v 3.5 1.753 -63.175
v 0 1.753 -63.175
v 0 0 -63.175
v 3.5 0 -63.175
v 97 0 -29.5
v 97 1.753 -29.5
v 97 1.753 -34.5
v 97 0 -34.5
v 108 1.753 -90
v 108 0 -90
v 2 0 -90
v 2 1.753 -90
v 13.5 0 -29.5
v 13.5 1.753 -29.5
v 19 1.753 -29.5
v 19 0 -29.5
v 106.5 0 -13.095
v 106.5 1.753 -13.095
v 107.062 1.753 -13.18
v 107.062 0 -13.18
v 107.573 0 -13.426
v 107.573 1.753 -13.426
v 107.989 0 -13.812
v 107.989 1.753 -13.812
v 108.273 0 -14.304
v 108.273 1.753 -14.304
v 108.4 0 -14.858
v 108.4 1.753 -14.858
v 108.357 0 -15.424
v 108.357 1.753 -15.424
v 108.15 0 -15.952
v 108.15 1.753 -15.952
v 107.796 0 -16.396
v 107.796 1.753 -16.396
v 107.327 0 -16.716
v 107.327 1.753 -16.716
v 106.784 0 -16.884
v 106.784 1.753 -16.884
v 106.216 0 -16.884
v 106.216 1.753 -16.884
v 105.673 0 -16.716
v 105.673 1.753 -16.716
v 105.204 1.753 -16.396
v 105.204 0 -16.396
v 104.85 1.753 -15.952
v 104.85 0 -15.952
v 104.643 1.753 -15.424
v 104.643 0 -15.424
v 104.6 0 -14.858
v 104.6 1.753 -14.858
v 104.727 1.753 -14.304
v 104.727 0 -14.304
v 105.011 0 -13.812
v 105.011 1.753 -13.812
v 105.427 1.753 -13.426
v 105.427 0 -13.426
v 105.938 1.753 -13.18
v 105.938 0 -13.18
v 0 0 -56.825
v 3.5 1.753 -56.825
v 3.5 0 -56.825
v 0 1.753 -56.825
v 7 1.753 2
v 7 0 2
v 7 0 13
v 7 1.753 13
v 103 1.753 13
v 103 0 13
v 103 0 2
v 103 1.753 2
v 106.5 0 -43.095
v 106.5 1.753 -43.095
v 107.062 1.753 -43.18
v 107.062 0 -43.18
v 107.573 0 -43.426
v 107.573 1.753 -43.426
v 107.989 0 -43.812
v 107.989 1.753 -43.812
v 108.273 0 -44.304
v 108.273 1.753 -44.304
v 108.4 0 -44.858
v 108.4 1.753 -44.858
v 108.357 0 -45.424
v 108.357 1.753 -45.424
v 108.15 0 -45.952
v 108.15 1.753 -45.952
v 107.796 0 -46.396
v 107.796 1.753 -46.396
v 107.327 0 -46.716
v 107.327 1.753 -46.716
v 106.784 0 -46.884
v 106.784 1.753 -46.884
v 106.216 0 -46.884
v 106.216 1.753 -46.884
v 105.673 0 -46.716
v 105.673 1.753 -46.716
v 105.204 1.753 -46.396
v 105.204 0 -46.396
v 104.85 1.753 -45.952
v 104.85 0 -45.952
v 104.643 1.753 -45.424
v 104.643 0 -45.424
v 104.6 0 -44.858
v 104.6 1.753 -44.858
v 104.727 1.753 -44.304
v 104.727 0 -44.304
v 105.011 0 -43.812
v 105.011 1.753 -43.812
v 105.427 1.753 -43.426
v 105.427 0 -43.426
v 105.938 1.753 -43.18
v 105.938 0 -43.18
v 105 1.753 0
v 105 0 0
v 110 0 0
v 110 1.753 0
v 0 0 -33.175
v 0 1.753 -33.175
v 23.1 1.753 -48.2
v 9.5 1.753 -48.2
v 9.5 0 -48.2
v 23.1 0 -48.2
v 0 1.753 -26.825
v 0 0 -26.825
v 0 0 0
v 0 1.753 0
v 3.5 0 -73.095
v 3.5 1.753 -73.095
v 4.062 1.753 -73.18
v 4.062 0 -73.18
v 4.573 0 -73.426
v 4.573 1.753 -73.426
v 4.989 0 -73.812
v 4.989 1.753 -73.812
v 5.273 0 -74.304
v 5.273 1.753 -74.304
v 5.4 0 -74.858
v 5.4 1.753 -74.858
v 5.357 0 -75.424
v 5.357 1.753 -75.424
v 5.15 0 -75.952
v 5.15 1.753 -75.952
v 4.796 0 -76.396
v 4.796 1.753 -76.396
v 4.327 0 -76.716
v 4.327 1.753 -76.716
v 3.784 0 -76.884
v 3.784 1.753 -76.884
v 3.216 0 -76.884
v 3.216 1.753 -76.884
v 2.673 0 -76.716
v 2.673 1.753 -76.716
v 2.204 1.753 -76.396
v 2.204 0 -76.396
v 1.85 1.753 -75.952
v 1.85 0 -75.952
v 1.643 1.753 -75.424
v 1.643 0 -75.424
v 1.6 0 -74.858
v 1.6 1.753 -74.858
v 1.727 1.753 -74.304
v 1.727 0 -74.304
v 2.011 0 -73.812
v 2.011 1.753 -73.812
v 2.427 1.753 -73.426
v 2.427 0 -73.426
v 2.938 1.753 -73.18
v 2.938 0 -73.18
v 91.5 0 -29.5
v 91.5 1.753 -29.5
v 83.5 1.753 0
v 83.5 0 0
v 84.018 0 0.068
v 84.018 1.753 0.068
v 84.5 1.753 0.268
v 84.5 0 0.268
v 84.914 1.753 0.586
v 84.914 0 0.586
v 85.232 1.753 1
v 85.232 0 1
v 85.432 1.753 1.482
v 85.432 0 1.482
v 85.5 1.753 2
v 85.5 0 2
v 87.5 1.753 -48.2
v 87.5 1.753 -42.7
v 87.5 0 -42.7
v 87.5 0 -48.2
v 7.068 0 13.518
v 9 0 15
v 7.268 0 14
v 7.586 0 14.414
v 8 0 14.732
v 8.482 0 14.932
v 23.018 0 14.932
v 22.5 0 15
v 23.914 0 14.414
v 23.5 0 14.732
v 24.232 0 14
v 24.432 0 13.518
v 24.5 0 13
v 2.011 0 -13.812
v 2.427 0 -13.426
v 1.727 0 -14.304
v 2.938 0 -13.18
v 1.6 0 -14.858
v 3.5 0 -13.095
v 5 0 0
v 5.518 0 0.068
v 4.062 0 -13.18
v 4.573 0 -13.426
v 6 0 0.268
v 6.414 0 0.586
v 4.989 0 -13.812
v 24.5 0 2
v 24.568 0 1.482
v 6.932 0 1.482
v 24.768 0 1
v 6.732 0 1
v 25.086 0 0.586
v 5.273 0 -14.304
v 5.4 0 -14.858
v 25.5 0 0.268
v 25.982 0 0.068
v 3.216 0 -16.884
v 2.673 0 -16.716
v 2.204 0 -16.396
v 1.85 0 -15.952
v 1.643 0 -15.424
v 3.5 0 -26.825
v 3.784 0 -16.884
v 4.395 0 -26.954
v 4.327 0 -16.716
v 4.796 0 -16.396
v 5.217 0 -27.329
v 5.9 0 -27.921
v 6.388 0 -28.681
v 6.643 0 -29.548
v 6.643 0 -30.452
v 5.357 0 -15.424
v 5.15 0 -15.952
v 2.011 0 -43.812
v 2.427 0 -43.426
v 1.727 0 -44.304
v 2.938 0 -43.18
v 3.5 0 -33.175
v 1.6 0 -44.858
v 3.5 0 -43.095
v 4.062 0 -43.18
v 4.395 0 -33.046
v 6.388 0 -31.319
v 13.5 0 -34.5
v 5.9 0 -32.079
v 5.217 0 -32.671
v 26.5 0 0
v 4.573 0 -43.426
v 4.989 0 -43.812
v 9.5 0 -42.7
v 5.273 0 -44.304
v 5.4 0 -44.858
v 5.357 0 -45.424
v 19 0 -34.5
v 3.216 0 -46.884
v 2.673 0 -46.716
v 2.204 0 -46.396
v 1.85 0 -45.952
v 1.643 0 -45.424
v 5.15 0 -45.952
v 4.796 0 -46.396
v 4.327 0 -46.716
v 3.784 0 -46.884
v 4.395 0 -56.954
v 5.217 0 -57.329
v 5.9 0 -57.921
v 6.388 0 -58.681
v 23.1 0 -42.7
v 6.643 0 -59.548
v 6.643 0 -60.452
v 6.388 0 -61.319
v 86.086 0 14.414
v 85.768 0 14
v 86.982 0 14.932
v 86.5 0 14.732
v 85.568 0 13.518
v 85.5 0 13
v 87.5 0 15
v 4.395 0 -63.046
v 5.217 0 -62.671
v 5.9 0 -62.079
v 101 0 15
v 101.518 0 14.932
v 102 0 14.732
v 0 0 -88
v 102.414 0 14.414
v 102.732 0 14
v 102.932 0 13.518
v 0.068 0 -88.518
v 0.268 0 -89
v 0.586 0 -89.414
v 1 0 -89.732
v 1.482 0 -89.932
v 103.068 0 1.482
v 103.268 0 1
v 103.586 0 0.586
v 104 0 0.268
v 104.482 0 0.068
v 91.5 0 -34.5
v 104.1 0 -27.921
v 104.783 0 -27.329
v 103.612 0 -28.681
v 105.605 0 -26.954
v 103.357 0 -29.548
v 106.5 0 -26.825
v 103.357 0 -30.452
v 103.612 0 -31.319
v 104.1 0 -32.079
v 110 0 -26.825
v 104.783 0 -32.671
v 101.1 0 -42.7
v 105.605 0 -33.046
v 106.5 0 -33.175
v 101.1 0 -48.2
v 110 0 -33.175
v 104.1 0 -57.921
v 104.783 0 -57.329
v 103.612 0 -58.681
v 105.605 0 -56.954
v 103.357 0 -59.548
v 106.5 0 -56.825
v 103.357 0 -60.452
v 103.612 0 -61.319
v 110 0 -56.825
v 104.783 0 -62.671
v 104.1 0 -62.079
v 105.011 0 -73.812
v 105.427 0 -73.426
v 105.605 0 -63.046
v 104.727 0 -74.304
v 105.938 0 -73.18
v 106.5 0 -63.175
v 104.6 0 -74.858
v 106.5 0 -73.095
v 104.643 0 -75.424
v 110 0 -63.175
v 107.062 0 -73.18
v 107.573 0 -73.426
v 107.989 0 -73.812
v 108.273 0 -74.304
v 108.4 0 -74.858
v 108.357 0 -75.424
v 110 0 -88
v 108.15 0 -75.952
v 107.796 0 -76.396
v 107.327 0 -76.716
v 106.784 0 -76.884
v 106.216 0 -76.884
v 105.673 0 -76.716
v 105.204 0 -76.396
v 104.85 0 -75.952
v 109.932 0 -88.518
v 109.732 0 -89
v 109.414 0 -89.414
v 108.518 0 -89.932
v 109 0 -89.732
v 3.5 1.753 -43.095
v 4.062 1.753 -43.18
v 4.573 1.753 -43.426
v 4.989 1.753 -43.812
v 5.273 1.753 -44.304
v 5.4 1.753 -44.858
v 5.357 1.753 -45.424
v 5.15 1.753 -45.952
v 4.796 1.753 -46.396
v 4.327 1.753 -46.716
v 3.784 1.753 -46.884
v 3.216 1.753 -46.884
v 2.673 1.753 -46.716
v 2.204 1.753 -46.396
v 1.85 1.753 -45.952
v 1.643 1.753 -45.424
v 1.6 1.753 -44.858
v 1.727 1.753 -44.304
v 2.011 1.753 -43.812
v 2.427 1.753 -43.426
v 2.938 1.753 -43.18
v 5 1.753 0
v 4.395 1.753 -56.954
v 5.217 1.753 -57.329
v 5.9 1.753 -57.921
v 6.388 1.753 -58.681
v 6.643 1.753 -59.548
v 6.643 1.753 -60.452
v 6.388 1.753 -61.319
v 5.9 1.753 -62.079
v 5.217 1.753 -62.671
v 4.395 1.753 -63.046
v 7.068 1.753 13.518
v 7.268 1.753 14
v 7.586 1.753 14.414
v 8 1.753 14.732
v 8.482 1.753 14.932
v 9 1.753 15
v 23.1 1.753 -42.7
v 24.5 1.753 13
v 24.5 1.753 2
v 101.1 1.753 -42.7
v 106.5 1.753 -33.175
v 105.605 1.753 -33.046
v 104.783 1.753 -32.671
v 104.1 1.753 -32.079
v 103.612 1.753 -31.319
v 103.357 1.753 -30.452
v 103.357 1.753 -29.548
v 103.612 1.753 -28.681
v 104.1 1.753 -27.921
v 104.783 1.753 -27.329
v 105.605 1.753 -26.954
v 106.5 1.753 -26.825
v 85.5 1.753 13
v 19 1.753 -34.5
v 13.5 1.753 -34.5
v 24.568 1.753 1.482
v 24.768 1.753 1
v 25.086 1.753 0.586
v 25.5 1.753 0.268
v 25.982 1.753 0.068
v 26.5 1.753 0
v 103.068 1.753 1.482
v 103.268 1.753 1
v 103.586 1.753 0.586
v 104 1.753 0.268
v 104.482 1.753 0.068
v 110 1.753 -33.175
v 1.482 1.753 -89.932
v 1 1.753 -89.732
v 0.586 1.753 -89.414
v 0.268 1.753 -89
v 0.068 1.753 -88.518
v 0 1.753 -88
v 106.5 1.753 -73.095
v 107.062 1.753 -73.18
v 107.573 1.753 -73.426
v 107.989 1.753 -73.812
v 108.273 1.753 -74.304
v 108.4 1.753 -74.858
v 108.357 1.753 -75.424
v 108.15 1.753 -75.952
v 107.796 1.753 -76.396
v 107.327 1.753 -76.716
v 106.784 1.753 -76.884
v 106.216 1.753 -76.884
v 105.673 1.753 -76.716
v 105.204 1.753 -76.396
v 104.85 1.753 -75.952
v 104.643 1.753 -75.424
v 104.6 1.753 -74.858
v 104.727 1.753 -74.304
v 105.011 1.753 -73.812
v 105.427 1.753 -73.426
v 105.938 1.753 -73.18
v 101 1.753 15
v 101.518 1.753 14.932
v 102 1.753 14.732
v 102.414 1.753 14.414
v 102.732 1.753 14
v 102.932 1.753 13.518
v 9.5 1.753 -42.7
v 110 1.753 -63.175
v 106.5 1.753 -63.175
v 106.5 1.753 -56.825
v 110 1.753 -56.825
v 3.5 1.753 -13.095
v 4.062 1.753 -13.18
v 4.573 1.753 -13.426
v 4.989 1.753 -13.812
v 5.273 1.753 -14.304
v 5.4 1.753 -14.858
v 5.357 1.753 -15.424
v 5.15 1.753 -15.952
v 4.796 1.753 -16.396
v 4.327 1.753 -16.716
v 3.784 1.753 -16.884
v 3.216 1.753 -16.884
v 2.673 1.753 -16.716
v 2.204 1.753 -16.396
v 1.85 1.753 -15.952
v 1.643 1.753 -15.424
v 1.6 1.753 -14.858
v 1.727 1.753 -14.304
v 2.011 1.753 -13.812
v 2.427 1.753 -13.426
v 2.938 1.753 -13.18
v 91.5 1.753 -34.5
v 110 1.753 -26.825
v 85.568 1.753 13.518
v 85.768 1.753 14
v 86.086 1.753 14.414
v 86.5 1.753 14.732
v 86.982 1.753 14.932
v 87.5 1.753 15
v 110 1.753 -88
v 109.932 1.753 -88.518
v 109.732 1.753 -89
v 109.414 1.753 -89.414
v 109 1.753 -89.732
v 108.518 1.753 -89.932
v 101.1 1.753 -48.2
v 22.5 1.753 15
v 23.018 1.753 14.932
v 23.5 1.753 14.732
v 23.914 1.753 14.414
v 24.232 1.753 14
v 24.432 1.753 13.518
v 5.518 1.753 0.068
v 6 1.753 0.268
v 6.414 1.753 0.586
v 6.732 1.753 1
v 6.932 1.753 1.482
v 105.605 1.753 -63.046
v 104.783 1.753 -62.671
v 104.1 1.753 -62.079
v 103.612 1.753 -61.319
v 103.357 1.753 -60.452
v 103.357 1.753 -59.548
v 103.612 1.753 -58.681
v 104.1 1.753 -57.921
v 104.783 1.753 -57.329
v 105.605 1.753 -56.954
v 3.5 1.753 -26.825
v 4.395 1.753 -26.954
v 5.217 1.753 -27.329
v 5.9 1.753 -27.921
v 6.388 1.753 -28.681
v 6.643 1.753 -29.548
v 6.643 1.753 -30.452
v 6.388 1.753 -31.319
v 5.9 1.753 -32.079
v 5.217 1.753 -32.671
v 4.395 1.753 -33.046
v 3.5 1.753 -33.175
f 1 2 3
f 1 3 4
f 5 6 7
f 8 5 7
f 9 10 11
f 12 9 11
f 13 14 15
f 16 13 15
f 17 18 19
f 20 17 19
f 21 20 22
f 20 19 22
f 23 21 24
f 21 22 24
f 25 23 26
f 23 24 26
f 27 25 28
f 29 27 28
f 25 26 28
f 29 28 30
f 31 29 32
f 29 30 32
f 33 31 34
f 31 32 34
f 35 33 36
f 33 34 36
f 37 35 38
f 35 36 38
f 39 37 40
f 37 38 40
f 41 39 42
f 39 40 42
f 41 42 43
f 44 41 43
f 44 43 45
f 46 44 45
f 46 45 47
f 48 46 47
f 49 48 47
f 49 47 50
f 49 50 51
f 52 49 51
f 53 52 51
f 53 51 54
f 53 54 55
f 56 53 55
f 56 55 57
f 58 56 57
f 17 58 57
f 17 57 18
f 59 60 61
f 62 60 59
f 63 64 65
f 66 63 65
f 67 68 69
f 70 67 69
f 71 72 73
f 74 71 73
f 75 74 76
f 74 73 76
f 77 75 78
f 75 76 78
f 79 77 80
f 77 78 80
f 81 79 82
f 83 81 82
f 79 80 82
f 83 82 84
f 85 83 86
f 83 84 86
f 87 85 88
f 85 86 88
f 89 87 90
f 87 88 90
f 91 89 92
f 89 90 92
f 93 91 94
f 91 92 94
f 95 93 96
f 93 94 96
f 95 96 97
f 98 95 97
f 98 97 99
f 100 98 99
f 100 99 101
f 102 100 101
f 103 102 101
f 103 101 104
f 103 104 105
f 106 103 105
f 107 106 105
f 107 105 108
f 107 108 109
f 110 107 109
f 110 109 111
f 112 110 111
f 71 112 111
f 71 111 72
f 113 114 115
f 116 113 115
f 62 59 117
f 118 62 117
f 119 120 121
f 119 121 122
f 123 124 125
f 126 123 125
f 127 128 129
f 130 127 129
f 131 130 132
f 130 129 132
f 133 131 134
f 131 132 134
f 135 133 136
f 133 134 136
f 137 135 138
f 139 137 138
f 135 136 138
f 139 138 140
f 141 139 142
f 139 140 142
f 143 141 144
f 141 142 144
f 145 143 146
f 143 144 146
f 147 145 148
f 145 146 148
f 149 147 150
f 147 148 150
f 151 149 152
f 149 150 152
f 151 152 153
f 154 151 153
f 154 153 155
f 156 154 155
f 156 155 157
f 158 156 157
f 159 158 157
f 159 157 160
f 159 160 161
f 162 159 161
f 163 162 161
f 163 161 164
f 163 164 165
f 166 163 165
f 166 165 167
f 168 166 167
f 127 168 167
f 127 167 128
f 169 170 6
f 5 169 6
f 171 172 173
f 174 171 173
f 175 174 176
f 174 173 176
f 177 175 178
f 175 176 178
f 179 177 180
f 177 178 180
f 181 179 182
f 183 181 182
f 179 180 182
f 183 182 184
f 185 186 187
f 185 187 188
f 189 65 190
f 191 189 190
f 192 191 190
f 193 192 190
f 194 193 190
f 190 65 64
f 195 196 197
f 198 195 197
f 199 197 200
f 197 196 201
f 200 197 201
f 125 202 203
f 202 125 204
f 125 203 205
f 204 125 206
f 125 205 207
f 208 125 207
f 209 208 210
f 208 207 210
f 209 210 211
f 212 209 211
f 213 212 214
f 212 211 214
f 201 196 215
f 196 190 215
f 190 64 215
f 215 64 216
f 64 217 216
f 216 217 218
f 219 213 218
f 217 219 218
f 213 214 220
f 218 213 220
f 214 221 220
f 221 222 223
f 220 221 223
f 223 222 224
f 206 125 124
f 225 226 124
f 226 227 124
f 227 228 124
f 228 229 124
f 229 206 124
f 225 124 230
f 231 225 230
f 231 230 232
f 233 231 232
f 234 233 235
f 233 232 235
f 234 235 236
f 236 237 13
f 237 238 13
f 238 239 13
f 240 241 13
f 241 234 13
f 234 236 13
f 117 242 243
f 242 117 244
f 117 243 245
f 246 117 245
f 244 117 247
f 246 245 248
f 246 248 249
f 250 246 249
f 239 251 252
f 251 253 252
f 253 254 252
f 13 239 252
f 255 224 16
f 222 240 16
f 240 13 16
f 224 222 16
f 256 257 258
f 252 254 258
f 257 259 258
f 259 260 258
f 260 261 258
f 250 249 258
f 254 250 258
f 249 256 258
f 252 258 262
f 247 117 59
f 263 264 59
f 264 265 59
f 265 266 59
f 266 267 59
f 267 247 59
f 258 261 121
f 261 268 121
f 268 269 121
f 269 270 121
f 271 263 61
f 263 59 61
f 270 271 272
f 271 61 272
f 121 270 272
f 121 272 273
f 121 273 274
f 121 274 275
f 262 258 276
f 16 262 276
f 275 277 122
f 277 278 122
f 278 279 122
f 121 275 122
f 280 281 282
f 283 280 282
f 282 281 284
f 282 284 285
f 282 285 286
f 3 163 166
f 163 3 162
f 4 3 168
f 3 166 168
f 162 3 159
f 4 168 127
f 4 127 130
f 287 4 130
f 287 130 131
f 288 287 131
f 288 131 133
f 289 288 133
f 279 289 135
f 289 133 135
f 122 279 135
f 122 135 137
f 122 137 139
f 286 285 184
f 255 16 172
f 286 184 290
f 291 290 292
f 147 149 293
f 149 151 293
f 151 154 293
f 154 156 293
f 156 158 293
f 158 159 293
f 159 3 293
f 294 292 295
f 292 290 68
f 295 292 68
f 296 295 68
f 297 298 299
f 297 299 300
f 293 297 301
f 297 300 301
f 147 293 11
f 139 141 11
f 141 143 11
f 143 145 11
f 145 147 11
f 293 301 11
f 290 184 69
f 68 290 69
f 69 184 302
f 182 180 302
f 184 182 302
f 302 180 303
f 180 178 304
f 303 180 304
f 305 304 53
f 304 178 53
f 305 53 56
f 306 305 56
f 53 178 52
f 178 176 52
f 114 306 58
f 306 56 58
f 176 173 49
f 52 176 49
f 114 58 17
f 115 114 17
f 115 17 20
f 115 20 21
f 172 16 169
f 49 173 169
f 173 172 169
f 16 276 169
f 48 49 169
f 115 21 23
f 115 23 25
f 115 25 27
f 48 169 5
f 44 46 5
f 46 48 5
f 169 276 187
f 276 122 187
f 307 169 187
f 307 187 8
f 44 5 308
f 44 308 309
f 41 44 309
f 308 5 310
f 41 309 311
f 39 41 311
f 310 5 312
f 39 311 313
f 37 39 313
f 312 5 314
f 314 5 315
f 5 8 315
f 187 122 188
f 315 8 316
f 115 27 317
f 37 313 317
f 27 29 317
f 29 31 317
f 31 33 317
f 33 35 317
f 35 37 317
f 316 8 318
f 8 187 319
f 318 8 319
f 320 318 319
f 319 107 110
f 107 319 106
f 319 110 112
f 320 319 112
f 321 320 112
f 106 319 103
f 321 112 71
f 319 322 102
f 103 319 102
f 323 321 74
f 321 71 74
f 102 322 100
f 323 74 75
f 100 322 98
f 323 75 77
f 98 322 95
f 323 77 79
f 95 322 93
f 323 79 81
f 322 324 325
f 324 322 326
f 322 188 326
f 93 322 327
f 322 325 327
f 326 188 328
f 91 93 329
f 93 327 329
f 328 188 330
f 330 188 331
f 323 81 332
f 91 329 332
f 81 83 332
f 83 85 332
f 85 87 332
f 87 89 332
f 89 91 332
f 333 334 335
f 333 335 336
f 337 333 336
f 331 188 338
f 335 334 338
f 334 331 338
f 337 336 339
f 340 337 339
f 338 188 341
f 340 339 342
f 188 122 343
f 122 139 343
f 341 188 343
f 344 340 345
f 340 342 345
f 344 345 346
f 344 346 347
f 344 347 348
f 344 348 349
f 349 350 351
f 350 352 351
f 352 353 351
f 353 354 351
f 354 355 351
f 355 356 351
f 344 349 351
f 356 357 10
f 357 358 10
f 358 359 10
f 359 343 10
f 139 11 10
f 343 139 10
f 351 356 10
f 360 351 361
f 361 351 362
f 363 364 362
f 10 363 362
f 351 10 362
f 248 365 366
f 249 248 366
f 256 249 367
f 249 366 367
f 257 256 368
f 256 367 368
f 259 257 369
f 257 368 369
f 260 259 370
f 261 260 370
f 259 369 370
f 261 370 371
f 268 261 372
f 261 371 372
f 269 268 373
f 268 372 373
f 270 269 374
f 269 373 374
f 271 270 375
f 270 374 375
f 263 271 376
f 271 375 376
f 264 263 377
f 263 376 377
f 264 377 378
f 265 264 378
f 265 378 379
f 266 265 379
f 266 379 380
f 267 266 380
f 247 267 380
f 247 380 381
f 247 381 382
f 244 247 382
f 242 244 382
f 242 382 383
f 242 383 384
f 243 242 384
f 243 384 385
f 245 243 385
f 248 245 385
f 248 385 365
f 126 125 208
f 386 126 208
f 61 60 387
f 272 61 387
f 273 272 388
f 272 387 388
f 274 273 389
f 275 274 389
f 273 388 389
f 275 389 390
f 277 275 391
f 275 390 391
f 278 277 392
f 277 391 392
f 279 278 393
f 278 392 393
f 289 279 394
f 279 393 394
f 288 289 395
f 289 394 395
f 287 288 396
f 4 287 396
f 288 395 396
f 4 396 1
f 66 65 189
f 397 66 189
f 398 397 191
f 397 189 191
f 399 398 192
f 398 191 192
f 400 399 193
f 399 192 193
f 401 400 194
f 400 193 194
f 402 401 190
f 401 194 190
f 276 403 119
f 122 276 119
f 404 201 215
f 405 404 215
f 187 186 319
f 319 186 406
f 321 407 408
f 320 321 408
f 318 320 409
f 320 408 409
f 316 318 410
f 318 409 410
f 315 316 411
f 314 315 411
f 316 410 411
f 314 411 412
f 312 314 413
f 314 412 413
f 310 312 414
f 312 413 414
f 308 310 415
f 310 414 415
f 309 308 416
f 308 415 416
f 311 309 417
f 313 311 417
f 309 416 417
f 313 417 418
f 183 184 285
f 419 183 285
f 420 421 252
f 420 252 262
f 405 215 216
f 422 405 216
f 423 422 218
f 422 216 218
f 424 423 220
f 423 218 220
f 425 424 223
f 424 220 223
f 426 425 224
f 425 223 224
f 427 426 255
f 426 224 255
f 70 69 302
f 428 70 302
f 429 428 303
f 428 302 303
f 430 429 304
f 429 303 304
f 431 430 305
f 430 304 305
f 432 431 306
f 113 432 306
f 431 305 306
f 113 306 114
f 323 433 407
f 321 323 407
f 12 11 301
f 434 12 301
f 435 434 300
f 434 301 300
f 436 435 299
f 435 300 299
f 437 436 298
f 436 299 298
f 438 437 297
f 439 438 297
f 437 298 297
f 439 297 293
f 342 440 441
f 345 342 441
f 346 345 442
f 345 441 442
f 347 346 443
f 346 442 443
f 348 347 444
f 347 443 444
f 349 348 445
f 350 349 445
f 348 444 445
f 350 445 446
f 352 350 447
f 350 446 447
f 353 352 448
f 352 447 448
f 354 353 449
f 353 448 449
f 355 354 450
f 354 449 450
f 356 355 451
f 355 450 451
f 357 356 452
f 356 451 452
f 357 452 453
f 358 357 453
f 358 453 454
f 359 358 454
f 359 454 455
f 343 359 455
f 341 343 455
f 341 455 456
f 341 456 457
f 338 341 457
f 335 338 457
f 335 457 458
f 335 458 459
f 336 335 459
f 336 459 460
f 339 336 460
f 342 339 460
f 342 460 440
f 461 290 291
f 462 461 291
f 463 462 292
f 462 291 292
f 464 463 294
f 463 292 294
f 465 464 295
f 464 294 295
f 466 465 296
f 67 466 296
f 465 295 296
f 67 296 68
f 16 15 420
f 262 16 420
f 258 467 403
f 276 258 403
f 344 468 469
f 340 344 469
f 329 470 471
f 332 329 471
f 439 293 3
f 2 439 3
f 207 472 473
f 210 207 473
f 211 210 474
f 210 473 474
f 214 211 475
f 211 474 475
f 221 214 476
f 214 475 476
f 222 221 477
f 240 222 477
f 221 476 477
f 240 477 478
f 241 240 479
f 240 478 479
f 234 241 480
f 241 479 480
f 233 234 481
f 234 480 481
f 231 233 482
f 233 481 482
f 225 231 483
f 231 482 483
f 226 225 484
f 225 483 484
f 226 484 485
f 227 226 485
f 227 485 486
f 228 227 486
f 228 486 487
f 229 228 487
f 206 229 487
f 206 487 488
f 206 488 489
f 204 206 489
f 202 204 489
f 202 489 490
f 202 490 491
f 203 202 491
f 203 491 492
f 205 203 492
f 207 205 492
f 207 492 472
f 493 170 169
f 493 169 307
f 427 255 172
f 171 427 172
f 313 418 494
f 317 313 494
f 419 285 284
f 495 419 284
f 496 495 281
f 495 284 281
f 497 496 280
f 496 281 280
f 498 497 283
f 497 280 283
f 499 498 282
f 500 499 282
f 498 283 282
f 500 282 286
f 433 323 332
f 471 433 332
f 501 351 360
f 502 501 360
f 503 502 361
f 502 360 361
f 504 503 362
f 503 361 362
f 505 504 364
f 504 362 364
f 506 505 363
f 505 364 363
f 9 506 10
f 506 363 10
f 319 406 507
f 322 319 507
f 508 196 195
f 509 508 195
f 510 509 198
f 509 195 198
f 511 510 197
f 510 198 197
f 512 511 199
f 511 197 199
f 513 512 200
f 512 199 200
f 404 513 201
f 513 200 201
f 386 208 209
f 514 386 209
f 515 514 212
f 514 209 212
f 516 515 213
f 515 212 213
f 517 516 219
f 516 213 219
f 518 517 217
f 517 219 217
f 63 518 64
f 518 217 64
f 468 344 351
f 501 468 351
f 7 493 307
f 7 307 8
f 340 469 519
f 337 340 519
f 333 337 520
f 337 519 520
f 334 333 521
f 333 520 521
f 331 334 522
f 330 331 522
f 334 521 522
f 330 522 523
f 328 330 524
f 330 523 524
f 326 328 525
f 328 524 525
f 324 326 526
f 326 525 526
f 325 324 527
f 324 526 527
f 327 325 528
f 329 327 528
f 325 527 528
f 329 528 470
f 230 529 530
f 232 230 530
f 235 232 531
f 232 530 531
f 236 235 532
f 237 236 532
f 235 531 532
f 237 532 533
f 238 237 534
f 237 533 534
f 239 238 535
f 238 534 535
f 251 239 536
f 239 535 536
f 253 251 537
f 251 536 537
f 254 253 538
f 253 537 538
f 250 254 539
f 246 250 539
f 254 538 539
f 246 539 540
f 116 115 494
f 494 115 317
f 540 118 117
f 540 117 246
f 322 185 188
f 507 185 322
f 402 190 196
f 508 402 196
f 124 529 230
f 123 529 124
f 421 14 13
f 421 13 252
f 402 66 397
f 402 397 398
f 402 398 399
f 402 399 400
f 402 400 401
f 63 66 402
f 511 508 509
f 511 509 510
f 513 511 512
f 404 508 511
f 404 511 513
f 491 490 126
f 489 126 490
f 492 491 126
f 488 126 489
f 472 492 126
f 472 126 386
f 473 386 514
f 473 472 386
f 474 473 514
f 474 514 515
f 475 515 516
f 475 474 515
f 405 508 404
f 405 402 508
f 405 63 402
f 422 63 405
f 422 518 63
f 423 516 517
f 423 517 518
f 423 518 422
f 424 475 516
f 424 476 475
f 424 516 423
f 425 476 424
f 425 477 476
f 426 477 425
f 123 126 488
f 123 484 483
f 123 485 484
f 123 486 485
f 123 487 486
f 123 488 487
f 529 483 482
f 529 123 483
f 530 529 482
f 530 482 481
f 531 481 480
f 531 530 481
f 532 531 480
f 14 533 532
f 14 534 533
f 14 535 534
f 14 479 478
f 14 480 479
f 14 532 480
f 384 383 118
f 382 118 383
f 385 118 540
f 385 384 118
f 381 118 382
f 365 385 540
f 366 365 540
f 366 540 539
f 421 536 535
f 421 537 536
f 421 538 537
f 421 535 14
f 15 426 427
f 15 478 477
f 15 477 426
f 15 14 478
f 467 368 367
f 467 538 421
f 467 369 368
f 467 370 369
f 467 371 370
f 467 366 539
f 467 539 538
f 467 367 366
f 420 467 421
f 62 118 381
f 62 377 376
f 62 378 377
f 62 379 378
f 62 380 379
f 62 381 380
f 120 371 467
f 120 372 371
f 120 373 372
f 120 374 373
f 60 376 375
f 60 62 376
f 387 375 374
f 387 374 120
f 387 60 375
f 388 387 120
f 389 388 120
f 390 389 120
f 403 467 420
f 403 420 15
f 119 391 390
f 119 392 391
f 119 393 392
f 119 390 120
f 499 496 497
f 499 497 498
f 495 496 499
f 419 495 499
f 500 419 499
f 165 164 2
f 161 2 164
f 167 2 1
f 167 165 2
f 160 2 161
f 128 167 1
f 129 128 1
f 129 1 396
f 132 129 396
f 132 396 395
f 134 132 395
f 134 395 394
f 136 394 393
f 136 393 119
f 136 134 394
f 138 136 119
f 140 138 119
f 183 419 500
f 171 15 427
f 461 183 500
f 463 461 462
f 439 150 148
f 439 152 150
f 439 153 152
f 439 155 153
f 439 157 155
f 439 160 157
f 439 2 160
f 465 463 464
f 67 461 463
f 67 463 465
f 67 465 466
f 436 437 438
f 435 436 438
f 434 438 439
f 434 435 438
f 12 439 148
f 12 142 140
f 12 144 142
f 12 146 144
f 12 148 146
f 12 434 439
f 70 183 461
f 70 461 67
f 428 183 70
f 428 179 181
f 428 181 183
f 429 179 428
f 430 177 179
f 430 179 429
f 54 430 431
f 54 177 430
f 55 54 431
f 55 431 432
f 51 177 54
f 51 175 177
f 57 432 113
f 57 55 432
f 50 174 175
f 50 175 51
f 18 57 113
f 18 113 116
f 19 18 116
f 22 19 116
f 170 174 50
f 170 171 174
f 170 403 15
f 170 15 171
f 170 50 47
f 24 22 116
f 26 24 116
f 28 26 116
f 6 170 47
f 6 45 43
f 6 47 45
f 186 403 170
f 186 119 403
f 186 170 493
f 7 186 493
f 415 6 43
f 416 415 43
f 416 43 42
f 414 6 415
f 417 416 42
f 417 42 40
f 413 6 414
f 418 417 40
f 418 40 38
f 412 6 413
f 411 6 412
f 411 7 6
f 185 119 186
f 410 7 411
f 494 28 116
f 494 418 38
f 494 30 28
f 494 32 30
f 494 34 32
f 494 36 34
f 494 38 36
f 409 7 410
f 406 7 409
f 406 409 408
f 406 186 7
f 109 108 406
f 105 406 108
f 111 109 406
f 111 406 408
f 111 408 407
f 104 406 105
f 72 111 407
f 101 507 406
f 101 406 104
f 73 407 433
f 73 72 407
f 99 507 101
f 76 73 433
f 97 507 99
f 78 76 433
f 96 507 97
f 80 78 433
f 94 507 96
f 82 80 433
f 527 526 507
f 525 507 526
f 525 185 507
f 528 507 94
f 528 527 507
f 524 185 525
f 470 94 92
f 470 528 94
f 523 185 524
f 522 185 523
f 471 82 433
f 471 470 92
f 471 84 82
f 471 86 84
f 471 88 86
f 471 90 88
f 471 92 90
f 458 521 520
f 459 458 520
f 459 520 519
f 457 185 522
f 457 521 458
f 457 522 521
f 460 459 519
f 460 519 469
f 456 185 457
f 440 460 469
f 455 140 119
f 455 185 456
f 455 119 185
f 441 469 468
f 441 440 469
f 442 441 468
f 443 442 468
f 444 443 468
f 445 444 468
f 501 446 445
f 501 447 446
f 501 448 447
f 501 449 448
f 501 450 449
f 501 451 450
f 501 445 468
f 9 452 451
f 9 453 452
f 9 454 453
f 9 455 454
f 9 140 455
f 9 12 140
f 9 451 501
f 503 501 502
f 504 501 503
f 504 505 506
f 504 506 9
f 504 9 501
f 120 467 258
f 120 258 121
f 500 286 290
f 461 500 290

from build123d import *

# Parameters (mm, degrees)
FR4_DEPTH                     = 1.7526
SKETCH6_W                     = 5.5
SKETCH6_H                     = 5
SKETCH6_W_2                   = 13.6
SKETCH6_H_2                   = 5.5
FIBER_TRANSCEIVER_SLOTS_DEPTH = 143.1375095
SKETCH7_R                     = 1.905
CUT_EXTRUDE1_DEPTH            = 143.1375095
SKETCH8_R                     = 3.175
CUT_EXTRUDE2_DEPTH            = 143.1375095
CUT_EXTRUDE3_DEPTH            = 143.1375095


with BuildPart() as part:
    # Sketch1 → FR4 (new body)
    with BuildSketch(Plane(origin=(0, 0, 0), x_dir=(1, 0, 0), z_dir=(0, 1, 0))):
        with BuildLine():
            Line((0, 0), (5, 0))
            ThreePointArc((5, 0), (6.414213562, -0.585786438), (7, -2))
            Line((7, -2), (7, -13))
            ThreePointArc((7, -13), (7.585786438, -14.414213562), (9, -15))
            Line((9, -15), (22.5, -15))
            ThreePointArc((22.5, -15), (23.914213562, -14.414213562), (24.5, -13))
            Line((24.5, -13), (24.5, -2))
            ThreePointArc((24.5, -2), (25.085786438, -0.585786438), (26.5, 0))
            Line((26.5, 0), (83.5, 0))
            ThreePointArc((83.5, 0), (84.914213562, -0.585786438), (85.5, -2))
            Line((85.5, -2), (85.5, -13))
            ThreePointArc((85.5, -13), (86.085786438, -14.414213562), (87.5, -15))
            Line((87.5, -15), (101, -15))
            ThreePointArc((101, -15), (102.414213562, -14.414213562), (103, -13))
            Line((103, -13), (103, -2))
            ThreePointArc((103, -2), (103.585786438, -0.585786438), (105, 0))
            Line((105, 0), (110, 0))
            Line((110, 0), (110, 88))
            ThreePointArc((110, 88), (109.414213562, 89.414213562), (108, 90))
            Line((108, 90), (2, 90))
            ThreePointArc((2, 90), (0.585786438, 89.414213562), (0, 88))
            Line((0, 88), (0, 0))
        make_face()
    extrude(amount=FR4_DEPTH)

    # Sketch6 → fiber-transceiver-slots (cut, through all)
    with BuildSketch(Plane(origin=(0, 1.7526, 0), x_dir=(1, 0, 0), z_dir=(0, 1, 0))):
        with Locations((16.25, 32)):
            Rectangle(SKETCH6_W, SKETCH6_H)
        with Locations((94.25, 32)):
            Rectangle(SKETCH6_W, SKETCH6_H)
        with Locations((94.3, 45.45)):
            Rectangle(SKETCH6_W_2, SKETCH6_H_2)
        with Locations((16.3, 45.45)):
            Rectangle(SKETCH6_W_2, SKETCH6_H_2)
    extrude(amount=-FIBER_TRANSCEIVER_SLOTS_DEPTH, mode=Mode.SUBTRACT)

    # Sketch7 → Cut-Extrude1 (cut, through all)
    with BuildSketch(Plane(origin=(0, 1.7526, 0), x_dir=(1, 0, 0), z_dir=(0, 1, 0))):
        with Locations(Location((3.5, 15, 0), (0, 0, 270))):
            Circle(SKETCH7_R)
        with Locations(Location((106.5, 15, 0), (0, 0, 270))):
            Circle(SKETCH7_R)
        with Locations(Location((106.5, 30, 0), (0, 0, 270))):
            Circle(SKETCH7_R)
        with Locations(Location((106.5, 45, 0), (0, 0, 270))):
            Circle(SKETCH7_R)
        with Locations(Location((106.5, 60, 0), (0, 0, 270))):
            Circle(SKETCH7_R)
        with Locations(Location((106.5, 75, 0), (0, 0, 270))):
            Circle(SKETCH7_R)
        with Locations(Location((3.5, 30, 0), (0, 0, 270))):
            Circle(SKETCH7_R)
        with Locations(Location((3.5, 45, 0), (0, 0, 270))):
            Circle(SKETCH7_R)
        with Locations(Location((3.5, 60, 0), (0, 0, 270))):
            Circle(SKETCH7_R)
        with Locations(Location((3.5, 75, 0), (0, 0, 270))):
            Circle(SKETCH7_R)
    extrude(amount=-CUT_EXTRUDE1_DEPTH, mode=Mode.SUBTRACT)

    # Sketch8 → Cut-Extrude2 (cut, through all)
    with BuildSketch(Plane(origin=(0, 1.7526, 0), x_dir=(1, 0, 0), z_dir=(0, 1, 0))):
        with Locations(Location((3.5, 30, 0), (0, 0, 270))):
            Circle(SKETCH8_R)
        with Locations(Location((3.5, 60, 0), (0, 0, 270))):
            Circle(SKETCH8_R)
        with Locations(Location((106.5, 60, 0), (0, 0, 270))):
            Circle(SKETCH8_R)
        with Locations(Location((106.5, 30, 0), (0, 0, 270))):
            Circle(SKETCH8_R)
    extrude(amount=-CUT_EXTRUDE2_DEPTH, mode=Mode.SUBTRACT)

    # Sketch9 → Cut-Extrude3 (cut, through all)
    with BuildSketch(Plane(origin=(0, 1.7526, 0), x_dir=(1, 0, 0), z_dir=(0, 1, 0))):
        with BuildLine():
            Line((0, 63.175), (3.5, 63.175))
            ThreePointArc((3.5, 63.175), (6.675, 60), (3.5, 56.825))
            Line((3.5, 56.825), (0, 56.825))
            Line((0, 56.825), (0, 63.175))
        make_face()
        with BuildLine():
            Line((0, 33.175), (3.5, 33.175))
            ThreePointArc((3.5, 33.175), (6.675, 30), (3.5, 26.825))
            Line((3.5, 26.825), (0, 26.825))
            Line((0, 26.825), (0, 33.175))
        make_face()
        with BuildLine():
            Line((110, 63.175), (106.5, 63.175))
            ThreePointArc((106.5, 63.175), (103.325, 60), (106.5, 56.825))
            Line((106.5, 56.825), (110, 56.825))
            Line((110, 56.825), (110, 63.175))
        make_face()
        with BuildLine():
            Line((110, 33.175), (106.5, 33.175))
            ThreePointArc((106.5, 33.175), (103.325, 30), (106.5, 26.825))
            Line((106.5, 26.825), (110, 26.825))
            Line((110, 26.825), (110, 33.175))
        make_face()
    extrude(amount=-CUT_EXTRUDE3_DEPTH, mode=Mode.SUBTRACT)


solid = part.part
